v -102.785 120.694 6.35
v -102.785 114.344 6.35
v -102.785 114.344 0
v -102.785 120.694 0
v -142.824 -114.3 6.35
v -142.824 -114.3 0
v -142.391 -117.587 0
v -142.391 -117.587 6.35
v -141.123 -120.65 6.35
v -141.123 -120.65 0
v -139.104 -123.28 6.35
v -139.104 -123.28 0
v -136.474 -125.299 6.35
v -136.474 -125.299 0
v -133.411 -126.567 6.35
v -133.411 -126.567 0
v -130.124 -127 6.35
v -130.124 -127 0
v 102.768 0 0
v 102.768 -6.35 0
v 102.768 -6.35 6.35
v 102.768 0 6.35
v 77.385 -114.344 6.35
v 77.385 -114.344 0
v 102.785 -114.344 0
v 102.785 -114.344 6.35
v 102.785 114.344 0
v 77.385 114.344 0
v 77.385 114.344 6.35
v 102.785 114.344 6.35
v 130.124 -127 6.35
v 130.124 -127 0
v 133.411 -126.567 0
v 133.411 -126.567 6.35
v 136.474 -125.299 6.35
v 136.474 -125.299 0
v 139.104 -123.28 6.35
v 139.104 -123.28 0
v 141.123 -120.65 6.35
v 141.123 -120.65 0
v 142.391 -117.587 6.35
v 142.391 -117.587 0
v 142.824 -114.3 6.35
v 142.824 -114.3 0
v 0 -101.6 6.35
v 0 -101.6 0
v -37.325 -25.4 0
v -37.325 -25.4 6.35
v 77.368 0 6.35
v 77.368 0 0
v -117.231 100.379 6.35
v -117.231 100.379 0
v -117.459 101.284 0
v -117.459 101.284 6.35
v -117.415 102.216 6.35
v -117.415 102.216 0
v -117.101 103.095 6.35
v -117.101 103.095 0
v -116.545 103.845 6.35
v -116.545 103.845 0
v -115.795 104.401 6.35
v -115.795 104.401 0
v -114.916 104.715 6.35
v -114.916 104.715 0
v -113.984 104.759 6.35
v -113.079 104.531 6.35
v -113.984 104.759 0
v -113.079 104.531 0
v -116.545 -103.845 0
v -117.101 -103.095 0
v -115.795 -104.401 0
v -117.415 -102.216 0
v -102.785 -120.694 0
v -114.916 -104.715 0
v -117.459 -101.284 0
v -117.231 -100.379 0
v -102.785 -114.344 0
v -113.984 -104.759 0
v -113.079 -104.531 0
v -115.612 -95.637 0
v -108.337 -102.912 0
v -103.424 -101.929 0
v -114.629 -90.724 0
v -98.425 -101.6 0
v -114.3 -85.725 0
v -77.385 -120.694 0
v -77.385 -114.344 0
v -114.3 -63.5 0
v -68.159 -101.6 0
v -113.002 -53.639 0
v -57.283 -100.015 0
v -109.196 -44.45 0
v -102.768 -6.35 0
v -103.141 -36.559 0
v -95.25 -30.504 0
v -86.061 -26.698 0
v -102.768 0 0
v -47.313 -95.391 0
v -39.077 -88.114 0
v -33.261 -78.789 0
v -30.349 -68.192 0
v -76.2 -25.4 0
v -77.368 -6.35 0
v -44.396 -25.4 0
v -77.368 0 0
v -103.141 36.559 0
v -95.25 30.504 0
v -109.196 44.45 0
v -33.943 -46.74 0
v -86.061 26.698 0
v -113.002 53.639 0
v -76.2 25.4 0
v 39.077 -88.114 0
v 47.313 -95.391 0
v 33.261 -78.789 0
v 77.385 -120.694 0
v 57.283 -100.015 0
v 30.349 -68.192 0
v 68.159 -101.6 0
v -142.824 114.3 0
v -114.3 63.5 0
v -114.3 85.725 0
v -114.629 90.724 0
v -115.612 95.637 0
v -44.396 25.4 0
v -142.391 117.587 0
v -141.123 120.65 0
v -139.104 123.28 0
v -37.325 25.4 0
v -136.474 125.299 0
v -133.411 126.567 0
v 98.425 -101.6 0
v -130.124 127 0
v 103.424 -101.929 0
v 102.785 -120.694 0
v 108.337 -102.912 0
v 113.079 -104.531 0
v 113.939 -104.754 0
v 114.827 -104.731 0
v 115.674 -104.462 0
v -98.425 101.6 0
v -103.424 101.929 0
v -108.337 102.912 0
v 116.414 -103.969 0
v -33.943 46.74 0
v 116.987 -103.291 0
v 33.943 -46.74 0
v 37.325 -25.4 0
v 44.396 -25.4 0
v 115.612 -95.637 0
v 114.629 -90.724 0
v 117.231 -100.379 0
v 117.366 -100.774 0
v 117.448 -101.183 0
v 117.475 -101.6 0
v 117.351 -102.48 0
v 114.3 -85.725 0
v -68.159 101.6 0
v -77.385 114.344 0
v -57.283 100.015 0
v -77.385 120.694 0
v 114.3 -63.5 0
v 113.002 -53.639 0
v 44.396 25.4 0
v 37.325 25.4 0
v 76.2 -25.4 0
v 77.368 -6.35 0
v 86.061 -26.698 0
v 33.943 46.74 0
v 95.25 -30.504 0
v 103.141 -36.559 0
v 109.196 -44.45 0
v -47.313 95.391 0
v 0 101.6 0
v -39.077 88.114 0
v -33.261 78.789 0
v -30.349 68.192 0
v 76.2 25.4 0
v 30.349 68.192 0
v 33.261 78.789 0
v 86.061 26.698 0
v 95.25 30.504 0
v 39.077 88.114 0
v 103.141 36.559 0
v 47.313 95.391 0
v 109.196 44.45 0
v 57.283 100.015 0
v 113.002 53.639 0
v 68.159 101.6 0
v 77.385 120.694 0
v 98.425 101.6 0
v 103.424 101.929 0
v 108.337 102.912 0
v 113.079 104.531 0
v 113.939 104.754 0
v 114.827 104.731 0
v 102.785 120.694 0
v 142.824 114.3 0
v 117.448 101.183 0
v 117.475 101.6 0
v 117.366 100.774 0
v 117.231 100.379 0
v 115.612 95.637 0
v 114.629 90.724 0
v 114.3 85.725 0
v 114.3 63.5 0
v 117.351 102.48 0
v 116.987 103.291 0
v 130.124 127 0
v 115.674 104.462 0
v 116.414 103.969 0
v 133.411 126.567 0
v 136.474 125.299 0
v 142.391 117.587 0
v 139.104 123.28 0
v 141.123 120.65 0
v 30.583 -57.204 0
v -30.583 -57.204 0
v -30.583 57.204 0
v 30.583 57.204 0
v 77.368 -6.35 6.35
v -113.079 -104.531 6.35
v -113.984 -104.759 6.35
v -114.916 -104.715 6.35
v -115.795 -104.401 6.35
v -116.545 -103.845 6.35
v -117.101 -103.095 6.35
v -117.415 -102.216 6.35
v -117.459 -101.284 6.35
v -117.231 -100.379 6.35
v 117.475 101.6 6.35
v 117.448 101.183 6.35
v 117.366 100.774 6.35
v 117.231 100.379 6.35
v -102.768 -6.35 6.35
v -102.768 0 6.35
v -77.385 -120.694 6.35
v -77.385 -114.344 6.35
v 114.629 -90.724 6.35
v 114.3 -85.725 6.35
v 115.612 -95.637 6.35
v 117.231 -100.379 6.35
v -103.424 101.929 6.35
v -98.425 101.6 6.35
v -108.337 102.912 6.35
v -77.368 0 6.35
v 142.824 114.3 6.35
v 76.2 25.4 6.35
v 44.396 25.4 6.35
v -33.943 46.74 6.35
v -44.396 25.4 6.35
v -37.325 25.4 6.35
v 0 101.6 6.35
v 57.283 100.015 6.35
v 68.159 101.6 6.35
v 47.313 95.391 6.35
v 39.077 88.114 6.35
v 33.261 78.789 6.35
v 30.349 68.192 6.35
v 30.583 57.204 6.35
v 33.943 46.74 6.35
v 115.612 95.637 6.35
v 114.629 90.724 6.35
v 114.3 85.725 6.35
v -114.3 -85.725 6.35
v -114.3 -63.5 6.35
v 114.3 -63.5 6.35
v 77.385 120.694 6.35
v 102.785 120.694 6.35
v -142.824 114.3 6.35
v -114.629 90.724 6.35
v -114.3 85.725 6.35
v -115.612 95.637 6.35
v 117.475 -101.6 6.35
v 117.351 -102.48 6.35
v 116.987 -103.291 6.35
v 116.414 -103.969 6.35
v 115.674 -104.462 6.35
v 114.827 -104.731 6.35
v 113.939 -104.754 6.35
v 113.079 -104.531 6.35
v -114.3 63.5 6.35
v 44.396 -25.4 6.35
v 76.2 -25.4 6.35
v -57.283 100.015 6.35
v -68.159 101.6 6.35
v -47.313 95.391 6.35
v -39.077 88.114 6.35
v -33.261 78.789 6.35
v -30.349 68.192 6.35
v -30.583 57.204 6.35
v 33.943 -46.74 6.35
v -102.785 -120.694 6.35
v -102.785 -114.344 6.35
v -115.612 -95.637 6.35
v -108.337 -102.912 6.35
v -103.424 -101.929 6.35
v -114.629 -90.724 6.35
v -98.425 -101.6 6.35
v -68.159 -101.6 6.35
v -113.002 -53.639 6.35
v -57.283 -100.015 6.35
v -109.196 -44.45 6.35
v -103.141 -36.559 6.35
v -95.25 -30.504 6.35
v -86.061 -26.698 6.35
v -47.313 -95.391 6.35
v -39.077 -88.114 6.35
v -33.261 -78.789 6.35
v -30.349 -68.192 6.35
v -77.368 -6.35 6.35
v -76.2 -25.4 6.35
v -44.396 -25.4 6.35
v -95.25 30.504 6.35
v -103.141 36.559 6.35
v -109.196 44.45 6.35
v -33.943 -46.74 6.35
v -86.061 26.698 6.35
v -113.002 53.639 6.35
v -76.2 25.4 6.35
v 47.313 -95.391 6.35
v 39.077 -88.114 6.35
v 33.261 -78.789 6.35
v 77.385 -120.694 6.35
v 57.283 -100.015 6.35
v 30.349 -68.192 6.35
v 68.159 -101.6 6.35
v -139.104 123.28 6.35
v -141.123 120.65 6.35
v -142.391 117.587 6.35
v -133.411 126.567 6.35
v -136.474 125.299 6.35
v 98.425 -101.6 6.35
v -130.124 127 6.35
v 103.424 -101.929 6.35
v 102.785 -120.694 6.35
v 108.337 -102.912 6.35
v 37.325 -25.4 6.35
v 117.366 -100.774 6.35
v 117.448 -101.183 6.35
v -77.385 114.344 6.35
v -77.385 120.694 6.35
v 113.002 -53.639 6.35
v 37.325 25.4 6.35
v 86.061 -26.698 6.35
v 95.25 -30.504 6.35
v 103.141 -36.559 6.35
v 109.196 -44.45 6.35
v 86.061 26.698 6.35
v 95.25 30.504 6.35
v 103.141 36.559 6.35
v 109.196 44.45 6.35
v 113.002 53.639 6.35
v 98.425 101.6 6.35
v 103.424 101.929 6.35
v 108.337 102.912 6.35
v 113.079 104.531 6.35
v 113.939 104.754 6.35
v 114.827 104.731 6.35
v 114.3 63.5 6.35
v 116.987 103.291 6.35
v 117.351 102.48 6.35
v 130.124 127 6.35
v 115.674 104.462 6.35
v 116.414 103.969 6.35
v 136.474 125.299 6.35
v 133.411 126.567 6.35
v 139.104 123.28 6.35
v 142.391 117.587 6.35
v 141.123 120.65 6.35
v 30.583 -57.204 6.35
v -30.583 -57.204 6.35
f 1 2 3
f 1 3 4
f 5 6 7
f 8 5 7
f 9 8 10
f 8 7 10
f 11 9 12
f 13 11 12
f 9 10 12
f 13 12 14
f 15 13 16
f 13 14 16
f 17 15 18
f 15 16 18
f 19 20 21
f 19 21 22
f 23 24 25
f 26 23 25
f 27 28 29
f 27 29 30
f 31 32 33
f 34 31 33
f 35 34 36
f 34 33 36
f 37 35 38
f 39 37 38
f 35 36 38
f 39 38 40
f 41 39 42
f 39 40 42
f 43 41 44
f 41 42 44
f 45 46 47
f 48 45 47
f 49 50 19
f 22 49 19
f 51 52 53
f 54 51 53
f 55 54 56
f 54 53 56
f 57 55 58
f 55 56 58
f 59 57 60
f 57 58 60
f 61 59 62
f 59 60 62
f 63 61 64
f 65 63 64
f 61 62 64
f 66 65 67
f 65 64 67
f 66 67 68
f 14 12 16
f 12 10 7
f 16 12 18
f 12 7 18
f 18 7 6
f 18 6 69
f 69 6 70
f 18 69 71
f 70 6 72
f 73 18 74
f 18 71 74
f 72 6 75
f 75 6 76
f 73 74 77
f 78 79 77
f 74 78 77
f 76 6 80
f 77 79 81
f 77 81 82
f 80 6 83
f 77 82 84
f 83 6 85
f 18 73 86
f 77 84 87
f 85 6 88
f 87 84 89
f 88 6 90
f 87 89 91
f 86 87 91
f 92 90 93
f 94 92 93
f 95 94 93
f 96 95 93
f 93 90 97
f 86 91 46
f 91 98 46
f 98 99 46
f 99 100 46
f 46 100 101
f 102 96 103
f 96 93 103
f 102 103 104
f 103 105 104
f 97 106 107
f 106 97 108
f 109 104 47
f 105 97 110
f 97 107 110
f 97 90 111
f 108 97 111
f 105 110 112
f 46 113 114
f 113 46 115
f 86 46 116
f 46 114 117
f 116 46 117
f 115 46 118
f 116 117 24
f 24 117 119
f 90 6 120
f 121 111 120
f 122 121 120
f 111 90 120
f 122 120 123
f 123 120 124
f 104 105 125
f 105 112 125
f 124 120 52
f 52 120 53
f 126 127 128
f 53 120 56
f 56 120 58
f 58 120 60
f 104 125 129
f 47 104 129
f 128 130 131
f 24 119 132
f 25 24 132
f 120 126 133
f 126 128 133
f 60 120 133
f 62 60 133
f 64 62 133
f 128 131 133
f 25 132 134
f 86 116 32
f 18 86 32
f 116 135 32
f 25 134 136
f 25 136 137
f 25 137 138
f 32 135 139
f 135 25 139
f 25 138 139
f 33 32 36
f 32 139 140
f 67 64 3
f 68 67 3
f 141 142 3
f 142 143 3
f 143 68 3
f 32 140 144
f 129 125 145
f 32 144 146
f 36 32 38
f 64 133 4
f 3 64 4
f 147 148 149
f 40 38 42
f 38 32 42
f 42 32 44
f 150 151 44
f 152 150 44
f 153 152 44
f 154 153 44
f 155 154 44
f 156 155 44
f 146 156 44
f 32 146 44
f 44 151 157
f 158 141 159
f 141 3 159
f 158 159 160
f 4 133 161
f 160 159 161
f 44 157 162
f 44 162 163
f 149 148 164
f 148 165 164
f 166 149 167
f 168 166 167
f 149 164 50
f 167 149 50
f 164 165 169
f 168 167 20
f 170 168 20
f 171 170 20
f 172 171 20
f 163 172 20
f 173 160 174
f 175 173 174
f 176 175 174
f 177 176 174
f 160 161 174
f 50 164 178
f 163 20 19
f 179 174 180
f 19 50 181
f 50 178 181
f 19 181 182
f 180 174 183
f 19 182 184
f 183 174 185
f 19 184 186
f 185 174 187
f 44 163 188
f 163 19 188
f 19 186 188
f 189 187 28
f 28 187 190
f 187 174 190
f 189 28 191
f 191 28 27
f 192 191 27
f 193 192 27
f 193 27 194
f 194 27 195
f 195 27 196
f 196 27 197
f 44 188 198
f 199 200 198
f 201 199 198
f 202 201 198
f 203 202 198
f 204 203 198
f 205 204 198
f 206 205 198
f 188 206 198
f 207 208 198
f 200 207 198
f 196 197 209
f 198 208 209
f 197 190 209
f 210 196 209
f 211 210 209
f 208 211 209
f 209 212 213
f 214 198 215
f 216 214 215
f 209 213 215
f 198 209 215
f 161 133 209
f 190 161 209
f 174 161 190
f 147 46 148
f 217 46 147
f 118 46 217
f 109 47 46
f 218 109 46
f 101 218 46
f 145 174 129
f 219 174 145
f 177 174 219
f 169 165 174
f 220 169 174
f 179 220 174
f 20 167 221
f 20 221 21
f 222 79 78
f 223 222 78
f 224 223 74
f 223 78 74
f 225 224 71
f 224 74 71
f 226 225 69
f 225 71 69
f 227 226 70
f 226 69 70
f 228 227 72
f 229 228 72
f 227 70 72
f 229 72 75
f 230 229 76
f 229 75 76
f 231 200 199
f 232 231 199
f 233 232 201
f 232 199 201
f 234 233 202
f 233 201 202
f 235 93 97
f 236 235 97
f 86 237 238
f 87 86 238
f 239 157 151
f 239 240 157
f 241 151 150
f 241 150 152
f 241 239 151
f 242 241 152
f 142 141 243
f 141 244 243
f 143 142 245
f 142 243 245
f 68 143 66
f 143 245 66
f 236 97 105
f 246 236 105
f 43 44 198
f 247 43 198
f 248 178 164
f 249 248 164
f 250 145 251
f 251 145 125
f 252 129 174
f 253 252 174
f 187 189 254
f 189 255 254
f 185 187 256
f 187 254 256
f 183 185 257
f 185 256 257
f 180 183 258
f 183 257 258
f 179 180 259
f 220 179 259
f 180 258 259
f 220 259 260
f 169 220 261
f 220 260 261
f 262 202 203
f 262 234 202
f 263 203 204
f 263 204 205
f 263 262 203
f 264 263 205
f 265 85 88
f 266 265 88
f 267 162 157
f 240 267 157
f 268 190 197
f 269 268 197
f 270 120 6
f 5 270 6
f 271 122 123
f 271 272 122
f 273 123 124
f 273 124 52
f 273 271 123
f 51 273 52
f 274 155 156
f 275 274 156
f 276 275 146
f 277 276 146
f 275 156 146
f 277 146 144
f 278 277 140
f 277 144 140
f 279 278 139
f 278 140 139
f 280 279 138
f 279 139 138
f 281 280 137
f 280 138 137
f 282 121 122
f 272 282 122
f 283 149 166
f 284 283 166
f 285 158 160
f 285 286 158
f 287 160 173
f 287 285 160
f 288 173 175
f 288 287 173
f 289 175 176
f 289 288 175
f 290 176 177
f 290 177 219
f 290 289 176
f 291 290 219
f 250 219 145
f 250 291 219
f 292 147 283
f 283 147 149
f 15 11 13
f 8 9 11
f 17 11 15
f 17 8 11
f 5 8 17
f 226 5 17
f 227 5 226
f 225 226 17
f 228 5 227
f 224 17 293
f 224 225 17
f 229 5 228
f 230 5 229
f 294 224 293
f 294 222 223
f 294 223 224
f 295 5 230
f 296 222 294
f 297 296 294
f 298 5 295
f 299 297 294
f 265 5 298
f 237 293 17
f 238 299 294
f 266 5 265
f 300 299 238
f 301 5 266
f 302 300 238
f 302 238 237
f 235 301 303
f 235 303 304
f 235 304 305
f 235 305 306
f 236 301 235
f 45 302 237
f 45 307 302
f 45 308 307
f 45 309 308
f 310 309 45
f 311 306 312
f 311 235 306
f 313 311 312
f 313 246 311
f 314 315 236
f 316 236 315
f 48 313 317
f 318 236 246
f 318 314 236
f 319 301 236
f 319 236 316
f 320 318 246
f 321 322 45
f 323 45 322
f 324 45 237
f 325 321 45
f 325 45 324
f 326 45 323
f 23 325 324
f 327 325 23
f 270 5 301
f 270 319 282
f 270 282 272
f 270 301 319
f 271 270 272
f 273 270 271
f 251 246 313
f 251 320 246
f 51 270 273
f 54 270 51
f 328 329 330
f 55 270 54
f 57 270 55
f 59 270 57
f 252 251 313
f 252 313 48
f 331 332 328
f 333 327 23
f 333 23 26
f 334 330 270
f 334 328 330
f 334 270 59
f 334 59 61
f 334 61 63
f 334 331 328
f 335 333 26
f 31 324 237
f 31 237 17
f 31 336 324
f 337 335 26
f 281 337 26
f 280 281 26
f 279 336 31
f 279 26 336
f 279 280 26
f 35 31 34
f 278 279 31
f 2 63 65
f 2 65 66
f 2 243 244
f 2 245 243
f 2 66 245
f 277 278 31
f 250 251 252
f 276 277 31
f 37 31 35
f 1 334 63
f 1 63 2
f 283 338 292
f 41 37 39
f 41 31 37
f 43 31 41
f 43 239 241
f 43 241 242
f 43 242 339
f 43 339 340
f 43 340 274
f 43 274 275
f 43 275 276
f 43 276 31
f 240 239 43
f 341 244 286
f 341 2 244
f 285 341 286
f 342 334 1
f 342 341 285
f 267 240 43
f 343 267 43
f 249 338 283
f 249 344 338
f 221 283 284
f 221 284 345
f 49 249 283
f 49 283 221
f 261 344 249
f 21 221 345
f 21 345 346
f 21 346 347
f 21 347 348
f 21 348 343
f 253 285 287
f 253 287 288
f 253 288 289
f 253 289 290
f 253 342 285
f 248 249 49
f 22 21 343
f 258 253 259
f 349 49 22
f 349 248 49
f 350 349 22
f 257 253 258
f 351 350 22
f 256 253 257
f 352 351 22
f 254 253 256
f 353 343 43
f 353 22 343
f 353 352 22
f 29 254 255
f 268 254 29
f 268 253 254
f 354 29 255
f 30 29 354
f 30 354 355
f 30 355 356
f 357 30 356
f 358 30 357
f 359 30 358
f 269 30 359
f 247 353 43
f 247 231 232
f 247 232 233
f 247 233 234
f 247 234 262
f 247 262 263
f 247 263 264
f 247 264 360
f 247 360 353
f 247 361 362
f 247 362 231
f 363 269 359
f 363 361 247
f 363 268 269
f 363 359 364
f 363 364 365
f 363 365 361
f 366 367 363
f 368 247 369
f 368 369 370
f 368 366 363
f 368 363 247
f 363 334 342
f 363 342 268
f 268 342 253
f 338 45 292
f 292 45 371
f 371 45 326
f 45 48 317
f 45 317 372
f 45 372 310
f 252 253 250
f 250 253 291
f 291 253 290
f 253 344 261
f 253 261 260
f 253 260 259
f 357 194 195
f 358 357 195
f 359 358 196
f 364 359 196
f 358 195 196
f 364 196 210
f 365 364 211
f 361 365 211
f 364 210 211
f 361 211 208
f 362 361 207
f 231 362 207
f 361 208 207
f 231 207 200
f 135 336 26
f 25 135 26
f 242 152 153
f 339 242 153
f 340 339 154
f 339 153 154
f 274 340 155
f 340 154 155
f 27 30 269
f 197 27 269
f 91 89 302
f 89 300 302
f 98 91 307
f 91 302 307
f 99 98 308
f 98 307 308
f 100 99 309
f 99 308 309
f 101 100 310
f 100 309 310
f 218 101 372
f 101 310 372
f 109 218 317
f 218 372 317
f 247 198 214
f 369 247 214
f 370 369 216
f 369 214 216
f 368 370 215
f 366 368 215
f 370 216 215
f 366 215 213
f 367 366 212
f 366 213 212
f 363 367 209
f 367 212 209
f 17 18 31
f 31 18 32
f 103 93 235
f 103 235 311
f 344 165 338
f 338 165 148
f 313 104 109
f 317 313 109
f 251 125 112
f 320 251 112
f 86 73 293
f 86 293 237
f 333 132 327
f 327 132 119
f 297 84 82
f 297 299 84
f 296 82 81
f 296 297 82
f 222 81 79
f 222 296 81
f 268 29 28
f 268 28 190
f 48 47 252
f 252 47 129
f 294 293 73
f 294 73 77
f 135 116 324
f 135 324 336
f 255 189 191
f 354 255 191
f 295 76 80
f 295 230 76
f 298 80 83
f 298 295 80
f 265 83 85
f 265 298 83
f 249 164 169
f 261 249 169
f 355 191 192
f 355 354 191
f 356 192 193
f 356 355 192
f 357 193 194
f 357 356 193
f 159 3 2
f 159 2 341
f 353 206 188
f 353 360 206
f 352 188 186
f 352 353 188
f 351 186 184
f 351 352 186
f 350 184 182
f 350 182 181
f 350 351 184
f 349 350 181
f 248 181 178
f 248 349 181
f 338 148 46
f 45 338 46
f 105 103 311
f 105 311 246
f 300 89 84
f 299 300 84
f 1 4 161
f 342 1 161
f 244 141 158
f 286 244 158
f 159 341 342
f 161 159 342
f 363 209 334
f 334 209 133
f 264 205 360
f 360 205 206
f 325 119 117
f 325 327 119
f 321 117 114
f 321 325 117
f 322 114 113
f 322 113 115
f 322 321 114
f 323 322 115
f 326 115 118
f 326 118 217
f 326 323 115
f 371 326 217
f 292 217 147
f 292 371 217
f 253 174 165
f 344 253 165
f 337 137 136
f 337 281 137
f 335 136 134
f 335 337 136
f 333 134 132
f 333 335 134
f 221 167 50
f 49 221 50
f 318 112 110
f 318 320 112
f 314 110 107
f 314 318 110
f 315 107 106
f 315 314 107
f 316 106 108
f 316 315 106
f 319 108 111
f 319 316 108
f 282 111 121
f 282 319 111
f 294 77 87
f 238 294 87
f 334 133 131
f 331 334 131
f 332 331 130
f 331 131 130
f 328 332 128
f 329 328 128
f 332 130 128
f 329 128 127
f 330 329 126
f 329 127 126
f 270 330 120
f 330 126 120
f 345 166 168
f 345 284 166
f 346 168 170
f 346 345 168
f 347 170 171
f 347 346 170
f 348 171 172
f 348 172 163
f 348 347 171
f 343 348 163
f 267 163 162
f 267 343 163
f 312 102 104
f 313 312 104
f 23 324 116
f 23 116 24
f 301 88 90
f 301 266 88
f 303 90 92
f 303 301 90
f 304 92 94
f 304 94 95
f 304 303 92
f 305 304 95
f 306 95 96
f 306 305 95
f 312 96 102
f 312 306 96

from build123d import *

# Parameters (mm, degrees)
F0_W     = 25.4
F0_H     = 6.35
F1_DEPTH = 6.35
F2_R     = 38.1


# Not quite as in the source:
# - a feature names something its author has since deleted; it is built from what else it names


with BuildPart() as f1:
    # F0 (on Top) → F1 (new body)
    with BuildSketch(Plane.XY):
        with BuildLine():
            ThreePointArc((142.8242, 114.3), (139.1044561211, 123.2802561211), (130.1242, 127))
            Line((130.1242, 127), (-130.1242, 127))
            ThreePointArc((-130.1242, 127), (-139.1044561211, 123.2802561211), (-142.8242, 114.3))
            Line((-142.8242, 114.3), (-142.8242, -114.3))
            ThreePointArc((-142.8242, -114.3), (-139.1044561211, -123.2802561211), (-130.1242, -127))
            Line((-130.1242, -127), (130.1242, -127))
            ThreePointArc((130.1242, -127), (139.1044561211, -123.2802561211), (142.8242, -114.3))
            Line((142.8242, -114.3), (142.8242, 114.3))
        make_face()
        with Locations((-90.0851422843, -117.5192241168)):
            Rectangle(F0_W, F0_H, mode=Mode.SUBTRACT)
        with Locations((-90.0684, -3.175)):
            Rectangle(F0_W, F0_H, mode=Mode.SUBTRACT)
        with Locations((90.0851422843, -117.5192241168)):
            Rectangle(F0_W, F0_H, mode=Mode.SUBTRACT)
        with Locations((90.0684, -3.175)):
            Rectangle(F0_W, F0_H, mode=Mode.SUBTRACT)
        with Locations((-90.0851422843, 117.5192241168)):
            Rectangle(F0_W, F0_H, mode=Mode.SUBTRACT)
        with BuildLine():
            Line((0, 101.6), (7.0708802395, 101.6))
            Line((7.0708802395, 101.6), (111.125, 101.6))
            ThreePointArc((111.125, 101.6), (114.3, 104.775), (117.475, 101.6))
            ThreePointArc((117.475, 101.6), (116.5450640303, 99.3549359697), (114.3, 98.425))
            Line((114.3, 98.425), (114.3, 25.4))
            Line((114.3, 25.4), (44.3961802395, 25.4))
            Line((44.3961802395, 25.4), (37.3253, 25.4))
            Line((37.3253, 25.4), (37.3253, -25.4))
            Line((37.3253, -25.4), (44.3961802395, -25.4))
            Line((44.3961802395, -25.4), (114.3, -25.4))
            Line((114.3, -25.4), (114.3, -98.425))
            ThreePointArc((114.3, -98.425), (116.5450640303, -99.3549359697), (117.475, -101.6))
            ThreePointArc((117.475, -101.6), (114.3, -104.775), (111.125, -101.6))
            Line((111.125, -101.6), (7.0708802395, -101.6))
            Line((7.0708802395, -101.6), (0, -101.6))
            Line((0, -101.6), (-7.0708802395, -101.6))
            Line((-7.0708802395, -101.6), (-111.125, -101.6))
            ThreePointArc((-111.125, -101.6), (-116.5450640303, -103.8450640303), (-114.3, -98.425))
            Line((-114.3, -98.425), (-114.3, -25.4))
            Line((-114.3, -25.4), (-44.3961802395, -25.4))
            Line((-44.3961802395, -25.4), (-37.3253, -25.4))
            Line((-37.3253, -25.4), (-37.3253, 25.4))
            Line((-37.3253, 25.4), (-44.3961802395, 25.4))
            Line((-44.3961802395, 25.4), (-114.3, 25.4))
            Line((-114.3, 25.4), (-114.3, 98.425))
            ThreePointArc((-114.3, 98.425), (-116.5450640303, 103.8450640303), (-111.125, 101.6))
            Line((-111.125, 101.6), (-7.0708802395, 101.6))
            Line((-7.0708802395, 101.6), (0, 101.6))
        make_face(mode=Mode.SUBTRACT)
        with Locations((90.0851422843, 117.5192241168)):
            Rectangle(F0_W, F0_H, mode=Mode.SUBTRACT)
        Polygon((-37.3253, 25.4), (0, 101.6), (-7.0708802395, 101.6), (-44.3961802395, 25.4), align=None)
        Polygon((44.3961802395, 25.4), (7.0708802395, 101.6), (0, 101.6), (37.3253, 25.4), align=None)
        Polygon((44.3961802395, -25.4), (37.3253, -25.4), (0, -101.6), (7.0708802395, -101.6), align=None)
        Polygon((0, -101.6), (-37.3253, -25.4), (-44.3961802395, -25.4), (-7.0708802395, -101.6), align=None)
    extrude(amount=F1_DEPTH)

    # F2
    f2_edges = [f1.edges().sort_by_distance(p)[0] for p in [
        (7.07088, 101.6, 3.175),
        (-7.07088, 101.6, 3.175),
        (114.3, 25.4, 3.175),
        (-114.3, 25.4, 3.175),
        (-114.3, -25.4, 3.175),
        (114.3, -25.4, 3.175),
        (-7.07088, -101.6, 3.175),
        (7.07088, -101.6, 3.175),
        (-114.3, 98.425, 3.175),
        (-111.125, 101.6, 3.175),
        (111.125, 101.6, 3.175),
        (114.3, 98.425, 3.175),
        (114.3, -98.425, 3.175),
        (111.125, -101.6, 3.175),
        (-111.125, -101.6, 3.175),
        (-114.3, -98.425, 3.175),
    ]]
    fillet(f2_edges, radius=F2_R)


solid = f1.part
